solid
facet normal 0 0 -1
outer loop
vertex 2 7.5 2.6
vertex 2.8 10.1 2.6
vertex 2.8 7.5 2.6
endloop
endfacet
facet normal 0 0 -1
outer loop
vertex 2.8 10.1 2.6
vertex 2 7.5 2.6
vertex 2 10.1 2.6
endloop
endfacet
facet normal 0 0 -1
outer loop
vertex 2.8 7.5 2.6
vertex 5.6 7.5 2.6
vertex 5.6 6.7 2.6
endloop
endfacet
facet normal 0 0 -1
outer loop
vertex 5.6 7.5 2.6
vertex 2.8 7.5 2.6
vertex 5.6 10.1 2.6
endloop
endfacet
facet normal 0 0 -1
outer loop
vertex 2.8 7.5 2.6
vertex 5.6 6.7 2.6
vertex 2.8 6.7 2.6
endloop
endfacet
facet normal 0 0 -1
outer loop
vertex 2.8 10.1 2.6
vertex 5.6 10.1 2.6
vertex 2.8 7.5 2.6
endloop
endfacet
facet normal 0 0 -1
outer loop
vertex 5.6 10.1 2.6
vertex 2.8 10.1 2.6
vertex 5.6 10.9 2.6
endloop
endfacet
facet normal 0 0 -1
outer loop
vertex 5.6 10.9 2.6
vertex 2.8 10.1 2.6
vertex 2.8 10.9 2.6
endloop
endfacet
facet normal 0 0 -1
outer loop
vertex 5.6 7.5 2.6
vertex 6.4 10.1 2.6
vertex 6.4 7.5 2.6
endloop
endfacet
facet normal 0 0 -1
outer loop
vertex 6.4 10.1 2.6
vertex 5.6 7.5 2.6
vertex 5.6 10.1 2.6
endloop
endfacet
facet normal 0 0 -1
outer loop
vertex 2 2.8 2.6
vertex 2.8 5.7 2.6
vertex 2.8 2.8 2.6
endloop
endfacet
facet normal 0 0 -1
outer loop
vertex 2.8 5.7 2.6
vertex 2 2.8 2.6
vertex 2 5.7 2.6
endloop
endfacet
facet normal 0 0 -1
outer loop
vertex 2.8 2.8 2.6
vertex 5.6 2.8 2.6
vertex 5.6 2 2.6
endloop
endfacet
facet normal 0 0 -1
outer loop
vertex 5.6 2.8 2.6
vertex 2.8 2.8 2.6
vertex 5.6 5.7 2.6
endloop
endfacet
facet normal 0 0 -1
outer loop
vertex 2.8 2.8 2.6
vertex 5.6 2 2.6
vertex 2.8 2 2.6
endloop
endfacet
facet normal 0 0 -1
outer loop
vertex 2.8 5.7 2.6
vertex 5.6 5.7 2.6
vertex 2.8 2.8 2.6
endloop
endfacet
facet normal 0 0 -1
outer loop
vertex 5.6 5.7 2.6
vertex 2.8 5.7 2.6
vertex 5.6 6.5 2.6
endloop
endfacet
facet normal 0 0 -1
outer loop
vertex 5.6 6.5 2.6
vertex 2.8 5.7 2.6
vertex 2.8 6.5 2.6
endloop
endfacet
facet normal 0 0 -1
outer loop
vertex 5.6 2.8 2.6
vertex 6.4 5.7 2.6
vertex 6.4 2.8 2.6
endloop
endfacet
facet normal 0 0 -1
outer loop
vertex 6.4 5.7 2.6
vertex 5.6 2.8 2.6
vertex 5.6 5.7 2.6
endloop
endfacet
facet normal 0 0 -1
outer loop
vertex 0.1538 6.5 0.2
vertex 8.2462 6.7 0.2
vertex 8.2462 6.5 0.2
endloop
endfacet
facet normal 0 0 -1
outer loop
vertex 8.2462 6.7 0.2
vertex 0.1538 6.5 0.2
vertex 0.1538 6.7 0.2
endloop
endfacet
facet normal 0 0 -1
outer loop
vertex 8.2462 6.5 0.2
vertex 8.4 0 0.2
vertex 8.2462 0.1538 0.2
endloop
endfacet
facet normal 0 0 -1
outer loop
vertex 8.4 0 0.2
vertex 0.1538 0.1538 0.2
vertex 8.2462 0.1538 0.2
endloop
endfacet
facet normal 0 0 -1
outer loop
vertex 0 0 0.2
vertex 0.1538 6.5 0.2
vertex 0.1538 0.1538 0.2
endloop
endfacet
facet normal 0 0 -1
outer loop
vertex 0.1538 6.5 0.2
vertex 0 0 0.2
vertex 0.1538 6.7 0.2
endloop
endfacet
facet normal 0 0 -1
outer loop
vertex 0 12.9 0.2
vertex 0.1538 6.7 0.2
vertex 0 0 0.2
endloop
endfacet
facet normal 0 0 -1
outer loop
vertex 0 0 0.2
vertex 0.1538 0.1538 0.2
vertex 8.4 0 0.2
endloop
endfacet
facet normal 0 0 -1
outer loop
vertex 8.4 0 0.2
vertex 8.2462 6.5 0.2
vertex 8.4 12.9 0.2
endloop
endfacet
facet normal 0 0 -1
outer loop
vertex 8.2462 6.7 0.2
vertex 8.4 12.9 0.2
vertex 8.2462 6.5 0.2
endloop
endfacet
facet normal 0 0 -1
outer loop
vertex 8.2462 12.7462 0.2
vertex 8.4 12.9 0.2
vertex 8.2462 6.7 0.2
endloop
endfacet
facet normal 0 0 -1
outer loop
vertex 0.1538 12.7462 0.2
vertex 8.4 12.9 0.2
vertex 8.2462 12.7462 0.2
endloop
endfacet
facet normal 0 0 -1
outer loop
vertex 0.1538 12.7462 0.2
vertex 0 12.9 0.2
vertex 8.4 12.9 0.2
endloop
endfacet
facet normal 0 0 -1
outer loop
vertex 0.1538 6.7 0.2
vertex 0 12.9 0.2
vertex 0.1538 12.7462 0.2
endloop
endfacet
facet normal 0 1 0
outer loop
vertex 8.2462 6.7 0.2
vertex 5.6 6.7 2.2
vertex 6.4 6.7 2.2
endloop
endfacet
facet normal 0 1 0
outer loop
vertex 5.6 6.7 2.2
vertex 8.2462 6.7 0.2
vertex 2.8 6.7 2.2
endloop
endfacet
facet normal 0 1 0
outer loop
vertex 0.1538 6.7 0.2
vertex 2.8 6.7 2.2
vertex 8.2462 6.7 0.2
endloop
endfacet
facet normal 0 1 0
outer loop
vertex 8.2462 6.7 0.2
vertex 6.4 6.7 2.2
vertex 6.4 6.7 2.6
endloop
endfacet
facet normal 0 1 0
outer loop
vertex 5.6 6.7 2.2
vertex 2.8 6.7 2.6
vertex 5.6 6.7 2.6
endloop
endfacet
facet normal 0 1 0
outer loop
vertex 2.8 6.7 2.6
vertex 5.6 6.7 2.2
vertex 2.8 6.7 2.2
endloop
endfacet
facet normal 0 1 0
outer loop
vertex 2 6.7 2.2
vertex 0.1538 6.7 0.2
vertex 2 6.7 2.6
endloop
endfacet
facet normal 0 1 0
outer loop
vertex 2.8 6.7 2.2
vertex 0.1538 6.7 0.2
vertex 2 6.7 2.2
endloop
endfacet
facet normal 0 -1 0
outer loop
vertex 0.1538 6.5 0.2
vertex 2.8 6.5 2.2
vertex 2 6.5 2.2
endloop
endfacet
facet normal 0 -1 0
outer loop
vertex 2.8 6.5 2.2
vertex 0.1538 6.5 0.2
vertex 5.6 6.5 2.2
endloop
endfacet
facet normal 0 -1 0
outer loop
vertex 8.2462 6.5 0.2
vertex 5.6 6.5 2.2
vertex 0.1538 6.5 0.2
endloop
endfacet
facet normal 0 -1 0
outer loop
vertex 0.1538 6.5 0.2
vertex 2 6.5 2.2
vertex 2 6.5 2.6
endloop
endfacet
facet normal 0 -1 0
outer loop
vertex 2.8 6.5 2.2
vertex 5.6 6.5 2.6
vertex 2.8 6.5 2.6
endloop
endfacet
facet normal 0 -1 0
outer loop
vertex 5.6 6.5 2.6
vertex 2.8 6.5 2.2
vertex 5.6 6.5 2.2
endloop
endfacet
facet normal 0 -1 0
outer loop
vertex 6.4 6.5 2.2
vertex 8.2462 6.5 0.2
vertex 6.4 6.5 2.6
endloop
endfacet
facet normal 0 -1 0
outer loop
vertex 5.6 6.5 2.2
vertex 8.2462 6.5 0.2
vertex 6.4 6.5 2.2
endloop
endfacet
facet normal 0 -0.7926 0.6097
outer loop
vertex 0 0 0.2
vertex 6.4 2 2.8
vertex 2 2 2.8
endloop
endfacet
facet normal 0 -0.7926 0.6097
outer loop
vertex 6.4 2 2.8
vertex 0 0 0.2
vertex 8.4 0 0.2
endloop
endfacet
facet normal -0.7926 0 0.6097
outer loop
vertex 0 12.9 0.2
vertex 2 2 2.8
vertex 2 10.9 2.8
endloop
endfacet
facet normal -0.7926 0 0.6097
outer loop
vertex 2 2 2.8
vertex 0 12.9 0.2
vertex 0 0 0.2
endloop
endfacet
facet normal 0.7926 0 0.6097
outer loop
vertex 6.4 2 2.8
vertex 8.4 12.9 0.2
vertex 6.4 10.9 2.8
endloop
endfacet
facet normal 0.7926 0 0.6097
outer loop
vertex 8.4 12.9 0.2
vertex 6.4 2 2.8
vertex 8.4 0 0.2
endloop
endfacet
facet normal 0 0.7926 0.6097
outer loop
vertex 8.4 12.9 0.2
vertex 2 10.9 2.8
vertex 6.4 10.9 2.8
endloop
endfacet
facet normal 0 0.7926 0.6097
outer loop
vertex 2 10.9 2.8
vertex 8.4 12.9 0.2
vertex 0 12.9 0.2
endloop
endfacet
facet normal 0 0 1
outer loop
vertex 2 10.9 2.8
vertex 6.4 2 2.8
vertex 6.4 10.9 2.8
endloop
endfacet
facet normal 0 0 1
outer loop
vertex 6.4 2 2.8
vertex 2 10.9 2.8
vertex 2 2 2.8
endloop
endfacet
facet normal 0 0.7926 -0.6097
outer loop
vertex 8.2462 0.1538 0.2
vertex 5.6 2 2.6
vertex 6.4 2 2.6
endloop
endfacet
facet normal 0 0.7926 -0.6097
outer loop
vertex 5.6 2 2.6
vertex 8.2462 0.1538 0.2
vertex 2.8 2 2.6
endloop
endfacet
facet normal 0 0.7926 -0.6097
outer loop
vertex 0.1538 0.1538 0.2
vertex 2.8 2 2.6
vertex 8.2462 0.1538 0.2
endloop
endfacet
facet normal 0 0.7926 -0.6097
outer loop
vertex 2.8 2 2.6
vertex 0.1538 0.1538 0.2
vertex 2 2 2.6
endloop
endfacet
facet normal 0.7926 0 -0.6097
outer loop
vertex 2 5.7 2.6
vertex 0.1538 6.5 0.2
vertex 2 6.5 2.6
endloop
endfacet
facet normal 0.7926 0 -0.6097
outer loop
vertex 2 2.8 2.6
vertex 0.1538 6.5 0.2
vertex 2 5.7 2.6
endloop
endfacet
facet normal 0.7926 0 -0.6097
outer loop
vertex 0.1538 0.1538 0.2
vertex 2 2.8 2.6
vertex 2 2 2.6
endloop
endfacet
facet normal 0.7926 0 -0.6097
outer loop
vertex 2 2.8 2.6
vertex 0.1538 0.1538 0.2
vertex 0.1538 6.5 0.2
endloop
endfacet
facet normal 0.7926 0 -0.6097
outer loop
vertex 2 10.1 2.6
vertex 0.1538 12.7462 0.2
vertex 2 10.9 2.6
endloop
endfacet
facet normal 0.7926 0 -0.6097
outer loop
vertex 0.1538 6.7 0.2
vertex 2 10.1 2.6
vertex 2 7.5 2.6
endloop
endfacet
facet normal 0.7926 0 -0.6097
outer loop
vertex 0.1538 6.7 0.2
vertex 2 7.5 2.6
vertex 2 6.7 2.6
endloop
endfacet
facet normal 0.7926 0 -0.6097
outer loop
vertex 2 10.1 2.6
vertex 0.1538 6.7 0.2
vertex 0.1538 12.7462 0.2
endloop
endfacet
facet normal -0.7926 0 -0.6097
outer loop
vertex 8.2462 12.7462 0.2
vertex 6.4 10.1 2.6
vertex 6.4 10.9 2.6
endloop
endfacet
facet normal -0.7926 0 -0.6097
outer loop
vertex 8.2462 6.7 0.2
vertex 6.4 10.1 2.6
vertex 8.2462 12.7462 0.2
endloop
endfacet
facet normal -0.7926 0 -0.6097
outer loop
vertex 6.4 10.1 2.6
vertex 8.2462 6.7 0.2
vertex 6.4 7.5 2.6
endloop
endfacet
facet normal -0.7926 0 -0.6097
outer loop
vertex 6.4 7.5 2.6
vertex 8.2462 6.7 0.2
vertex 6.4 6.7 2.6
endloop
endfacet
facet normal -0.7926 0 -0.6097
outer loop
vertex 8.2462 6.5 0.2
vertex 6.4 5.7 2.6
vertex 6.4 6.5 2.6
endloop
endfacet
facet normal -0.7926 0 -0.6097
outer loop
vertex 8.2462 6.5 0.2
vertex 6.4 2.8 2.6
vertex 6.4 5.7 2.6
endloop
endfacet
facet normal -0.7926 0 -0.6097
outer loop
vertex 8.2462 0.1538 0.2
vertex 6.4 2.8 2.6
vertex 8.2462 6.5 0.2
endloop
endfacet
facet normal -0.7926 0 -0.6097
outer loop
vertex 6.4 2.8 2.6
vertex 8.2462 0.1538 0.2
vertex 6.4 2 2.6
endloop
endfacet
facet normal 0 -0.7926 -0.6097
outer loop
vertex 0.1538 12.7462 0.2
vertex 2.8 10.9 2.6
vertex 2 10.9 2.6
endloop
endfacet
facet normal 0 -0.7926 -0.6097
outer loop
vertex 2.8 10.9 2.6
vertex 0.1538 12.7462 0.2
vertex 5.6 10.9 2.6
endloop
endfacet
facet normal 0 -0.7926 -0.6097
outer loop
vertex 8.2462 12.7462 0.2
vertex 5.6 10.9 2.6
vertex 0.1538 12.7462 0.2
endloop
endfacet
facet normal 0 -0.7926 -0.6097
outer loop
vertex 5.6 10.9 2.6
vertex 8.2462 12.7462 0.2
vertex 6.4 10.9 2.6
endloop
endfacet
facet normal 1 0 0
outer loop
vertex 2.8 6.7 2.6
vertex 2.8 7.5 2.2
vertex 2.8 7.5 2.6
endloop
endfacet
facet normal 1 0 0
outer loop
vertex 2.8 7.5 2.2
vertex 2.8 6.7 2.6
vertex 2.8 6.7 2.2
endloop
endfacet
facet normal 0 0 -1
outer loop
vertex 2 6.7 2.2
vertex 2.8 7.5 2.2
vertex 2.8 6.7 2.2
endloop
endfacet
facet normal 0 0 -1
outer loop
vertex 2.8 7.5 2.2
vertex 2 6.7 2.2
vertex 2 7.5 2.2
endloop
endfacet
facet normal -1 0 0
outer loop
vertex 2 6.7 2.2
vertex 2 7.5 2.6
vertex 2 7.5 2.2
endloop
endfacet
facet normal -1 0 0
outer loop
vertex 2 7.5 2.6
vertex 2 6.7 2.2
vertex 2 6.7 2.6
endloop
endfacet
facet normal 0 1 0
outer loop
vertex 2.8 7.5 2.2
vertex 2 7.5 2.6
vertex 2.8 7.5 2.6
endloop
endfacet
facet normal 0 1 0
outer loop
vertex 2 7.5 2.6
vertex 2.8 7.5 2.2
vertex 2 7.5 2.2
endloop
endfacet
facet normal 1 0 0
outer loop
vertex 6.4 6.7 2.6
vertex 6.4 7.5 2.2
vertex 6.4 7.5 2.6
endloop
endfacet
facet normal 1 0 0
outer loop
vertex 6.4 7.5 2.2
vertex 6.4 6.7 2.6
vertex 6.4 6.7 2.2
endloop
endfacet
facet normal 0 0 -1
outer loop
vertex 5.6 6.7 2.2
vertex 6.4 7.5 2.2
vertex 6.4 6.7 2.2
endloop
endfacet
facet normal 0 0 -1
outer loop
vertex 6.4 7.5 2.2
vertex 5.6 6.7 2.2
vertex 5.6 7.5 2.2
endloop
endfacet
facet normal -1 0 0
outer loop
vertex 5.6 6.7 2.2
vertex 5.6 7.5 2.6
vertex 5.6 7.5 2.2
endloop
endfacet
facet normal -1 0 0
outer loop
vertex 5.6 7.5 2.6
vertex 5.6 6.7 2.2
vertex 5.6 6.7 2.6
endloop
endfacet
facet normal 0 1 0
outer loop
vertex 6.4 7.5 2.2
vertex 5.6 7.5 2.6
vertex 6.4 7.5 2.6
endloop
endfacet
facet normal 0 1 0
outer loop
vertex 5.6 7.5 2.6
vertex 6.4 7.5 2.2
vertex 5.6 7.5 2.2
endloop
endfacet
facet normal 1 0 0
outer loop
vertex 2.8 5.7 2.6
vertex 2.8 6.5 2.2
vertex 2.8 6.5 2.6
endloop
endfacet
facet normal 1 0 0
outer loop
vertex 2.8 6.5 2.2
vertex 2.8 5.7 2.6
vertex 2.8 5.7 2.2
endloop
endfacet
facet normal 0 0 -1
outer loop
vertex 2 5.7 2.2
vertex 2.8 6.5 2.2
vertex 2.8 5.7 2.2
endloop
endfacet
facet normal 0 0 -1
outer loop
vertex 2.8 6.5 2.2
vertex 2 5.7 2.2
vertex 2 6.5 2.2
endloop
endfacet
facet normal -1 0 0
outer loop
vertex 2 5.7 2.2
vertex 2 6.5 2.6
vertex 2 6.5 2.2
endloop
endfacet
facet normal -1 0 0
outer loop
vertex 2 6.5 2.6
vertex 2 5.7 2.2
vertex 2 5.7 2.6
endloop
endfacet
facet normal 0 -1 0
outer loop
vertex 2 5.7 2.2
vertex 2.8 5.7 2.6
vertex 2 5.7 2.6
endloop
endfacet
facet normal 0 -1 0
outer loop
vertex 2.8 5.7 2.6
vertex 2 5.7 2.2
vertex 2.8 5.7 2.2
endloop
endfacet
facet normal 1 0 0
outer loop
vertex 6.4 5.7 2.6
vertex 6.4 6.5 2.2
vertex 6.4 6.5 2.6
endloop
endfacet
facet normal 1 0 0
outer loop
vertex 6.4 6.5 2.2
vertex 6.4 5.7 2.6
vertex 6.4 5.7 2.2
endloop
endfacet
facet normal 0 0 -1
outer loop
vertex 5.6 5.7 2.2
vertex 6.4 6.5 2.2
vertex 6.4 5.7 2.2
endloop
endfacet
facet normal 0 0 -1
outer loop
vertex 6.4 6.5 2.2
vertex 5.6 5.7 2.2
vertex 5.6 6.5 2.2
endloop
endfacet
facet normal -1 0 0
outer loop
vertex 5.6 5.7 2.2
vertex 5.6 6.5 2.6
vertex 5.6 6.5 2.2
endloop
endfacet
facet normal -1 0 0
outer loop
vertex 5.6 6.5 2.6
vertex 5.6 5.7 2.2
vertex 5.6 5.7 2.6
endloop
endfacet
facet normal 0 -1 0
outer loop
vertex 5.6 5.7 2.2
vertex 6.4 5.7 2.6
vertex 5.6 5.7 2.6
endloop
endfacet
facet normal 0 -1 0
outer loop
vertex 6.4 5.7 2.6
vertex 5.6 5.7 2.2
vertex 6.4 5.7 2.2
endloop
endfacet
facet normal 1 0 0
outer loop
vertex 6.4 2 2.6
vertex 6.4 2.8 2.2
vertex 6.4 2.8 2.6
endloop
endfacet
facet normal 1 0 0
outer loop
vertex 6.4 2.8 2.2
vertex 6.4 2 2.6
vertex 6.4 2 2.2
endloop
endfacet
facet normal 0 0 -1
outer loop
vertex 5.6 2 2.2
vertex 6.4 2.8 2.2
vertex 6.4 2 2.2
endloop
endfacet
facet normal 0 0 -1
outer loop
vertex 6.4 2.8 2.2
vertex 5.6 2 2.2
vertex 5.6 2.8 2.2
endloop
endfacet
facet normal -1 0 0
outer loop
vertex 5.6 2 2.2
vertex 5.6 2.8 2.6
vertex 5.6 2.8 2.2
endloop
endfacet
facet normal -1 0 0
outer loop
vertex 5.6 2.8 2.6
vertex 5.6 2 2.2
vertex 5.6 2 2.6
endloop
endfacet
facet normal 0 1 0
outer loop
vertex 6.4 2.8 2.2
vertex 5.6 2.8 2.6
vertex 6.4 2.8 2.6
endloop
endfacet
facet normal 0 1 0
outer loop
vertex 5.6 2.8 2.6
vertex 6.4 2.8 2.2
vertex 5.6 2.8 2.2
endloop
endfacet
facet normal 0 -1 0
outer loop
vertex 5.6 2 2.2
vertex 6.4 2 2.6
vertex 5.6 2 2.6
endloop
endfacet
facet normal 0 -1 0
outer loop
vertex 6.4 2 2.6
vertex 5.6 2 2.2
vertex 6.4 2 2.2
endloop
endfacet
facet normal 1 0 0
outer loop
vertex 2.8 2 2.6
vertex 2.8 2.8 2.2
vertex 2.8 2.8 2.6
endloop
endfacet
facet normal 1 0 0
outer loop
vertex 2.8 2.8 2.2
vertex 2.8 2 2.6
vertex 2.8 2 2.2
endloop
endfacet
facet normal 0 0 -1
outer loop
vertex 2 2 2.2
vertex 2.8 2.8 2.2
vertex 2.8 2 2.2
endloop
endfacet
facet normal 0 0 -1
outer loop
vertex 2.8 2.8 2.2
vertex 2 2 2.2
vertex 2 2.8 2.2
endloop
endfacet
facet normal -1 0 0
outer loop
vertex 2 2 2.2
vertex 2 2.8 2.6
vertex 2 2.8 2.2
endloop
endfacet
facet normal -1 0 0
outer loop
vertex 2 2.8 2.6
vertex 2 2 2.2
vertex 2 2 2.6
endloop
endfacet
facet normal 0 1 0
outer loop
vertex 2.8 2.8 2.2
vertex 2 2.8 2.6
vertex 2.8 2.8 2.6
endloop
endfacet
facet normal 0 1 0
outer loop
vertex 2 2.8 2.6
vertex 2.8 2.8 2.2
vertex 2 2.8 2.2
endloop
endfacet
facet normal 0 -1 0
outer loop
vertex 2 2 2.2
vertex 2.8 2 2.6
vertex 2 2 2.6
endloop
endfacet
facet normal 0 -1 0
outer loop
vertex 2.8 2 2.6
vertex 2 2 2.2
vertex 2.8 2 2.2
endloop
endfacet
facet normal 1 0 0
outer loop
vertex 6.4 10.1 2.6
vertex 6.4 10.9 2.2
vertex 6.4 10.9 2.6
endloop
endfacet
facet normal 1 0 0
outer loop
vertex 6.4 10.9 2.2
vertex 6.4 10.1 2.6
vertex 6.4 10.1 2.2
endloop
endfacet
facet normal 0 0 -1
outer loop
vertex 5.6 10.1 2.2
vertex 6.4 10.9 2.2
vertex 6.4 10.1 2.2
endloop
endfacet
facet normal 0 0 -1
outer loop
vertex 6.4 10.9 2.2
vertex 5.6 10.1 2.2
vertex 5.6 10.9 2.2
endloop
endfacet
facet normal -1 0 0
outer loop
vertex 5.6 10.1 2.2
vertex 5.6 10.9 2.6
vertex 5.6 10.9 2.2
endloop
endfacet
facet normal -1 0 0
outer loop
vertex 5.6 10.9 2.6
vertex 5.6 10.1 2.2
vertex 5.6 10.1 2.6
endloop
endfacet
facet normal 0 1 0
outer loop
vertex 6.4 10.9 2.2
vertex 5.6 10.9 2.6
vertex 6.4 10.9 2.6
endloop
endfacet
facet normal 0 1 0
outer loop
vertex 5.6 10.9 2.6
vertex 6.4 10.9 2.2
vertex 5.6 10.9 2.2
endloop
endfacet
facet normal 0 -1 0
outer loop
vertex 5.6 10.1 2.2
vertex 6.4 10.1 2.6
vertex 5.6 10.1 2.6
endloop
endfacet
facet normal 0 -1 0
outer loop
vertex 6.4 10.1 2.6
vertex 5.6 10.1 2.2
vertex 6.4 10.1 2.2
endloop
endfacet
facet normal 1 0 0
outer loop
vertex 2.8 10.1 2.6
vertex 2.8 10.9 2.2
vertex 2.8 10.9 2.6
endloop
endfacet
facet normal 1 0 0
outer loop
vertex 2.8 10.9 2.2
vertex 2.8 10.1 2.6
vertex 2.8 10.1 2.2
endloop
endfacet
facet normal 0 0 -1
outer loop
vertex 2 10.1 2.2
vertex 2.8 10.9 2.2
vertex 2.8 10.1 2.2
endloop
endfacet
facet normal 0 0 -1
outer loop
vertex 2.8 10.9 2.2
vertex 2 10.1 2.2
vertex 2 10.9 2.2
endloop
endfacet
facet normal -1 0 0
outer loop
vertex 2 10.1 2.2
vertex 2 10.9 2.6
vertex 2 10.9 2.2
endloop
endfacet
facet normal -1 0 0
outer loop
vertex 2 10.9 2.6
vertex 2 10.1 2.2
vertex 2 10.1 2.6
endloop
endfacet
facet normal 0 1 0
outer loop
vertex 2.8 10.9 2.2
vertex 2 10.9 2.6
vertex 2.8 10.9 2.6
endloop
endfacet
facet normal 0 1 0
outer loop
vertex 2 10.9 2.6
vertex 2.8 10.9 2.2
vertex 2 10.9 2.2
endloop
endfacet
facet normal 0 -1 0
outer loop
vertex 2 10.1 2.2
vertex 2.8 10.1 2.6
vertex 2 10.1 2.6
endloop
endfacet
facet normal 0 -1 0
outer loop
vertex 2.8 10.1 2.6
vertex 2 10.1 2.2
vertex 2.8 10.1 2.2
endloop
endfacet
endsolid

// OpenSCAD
// file: ../modules/objects/tapered_cuboid.scad
// Creates a tapered cuboid

module tapered_cuboid(width, length, height, taper) {
	ho = taper;
	hwidth = width - taper;
	hlength = length - taper;
	polyhedron( points=[
		[ 0,  0, 0],
		[ho, ho, height],
		[hwidth, ho, height],
		[ width,  0, 0],
		[ 0,  length, 0],
		[ho, hlength, height],
		[hwidth, hlength, height],
		[ width,  length, 0] 
	], faces = [
		//side face
		[0, 1, 2],
		[2, 3, 0],
		//side face
		[3, 2, 6],
		[6, 7, 3],
		//side face
		[7, 6, 5],
		[5, 4, 7],
		//side face
		[4, 5, 1],
		[1, 0, 4],
		//top face
		[1, 5, 2],
		[2, 5, 6],
		//bottom face
		[4, 0, 3],
		[7, 4, 3],
	] );
}
// file: ../modules/objects/right_angled_triangle.scad
// Creates a right angled triangle

module right_angled_triangle(width, length, height) {
    linear_extrude(height)
    polygon(points=[[0, 0], [width, 0], [0, length]]);
}
// file: ../modules/objects/perforated_plate.scad
// Creates a square plate with holes in it

module perforated_plate(size, hole_diameter, distance_to_border, hole_count = [2,2] ) {

	if (hole_count.x == 0 || hole_count.y == 0) {

		cube( size );

	} else {

		difference() {

			cube( size );

			randabstand   = distance_to_border + hole_diameter/2;
			x_lochdistanz = hole_count.x > 1 ? (size.x - 2*randabstand) / (hole_count.x - 1) : 0;
			y_lochdistanz = hole_count.y > 1 ? (size.y - 2*randabstand) / (hole_count.y - 1) : 0;
			x_werte       = hole_count.x > 1 ? 
							[randabstand : x_lochdistanz : size.x - randabstand + 0.1] :
							[size.x / 2];
			y_werte       = hole_count.y > 1 ?
			                [randabstand : y_lochdistanz : size.y - randabstand + 0.1] :
			                [size.y / 2];

			// Bohrlöcher
			for (x = x_werte, y = y_werte)
		    translate( [x, y, -1] )
		    cylinder( d = hole_diameter, h = size.z + 2);

		}

	}
}
// main file
include <../modules/objects/perforated_plate.scad>
include <../modules/objects/right_angled_triangle.scad>
include <../modules/objects/tapered_cuboid.scad>

$fn=360;

// Spacers
translate([2,6.7,2.2]) {
    cube([.8,.8,.4]);
}

translate([5.6,6.7,2.2]) {
    cube([.8,.8,.4]);
}

translate([2.0,5.7,2.2]) {
    cube([.8,.8,.4]);
}

translate([5.6,5.7,2.2]) {
    cube([.8,.8,.4]);
}

translate([5.6,2,2.2]) {
    cube([.8,.8,.4]);
}

translate([2.0,2,2.2]) {
    cube([.8,.8,.4]);
}

translate([5.6,10.1,2.2]) {
    cube([.8,.8,.4]);
}

translate([2.0,10.1,2.2]) {
    cube([.8,.8,.4]);
}


// Middle wall
difference() {
    translate([0,6.5,.2]) {
        cube([8.4,.2,2.4]);
    }

    translate([-0.2,6.4,2.7]) {
        rotate([-90,0,0]) {
            right_angled_triangle(2.2,2.8,.4);
        }
    }

    translate([8.6,6.4,2.7]) {
        rotate([-90,0,00]) {
            right_angled_triangle(-2.2,2.8,.4);
        }
    }
}

// Hull
difference() {
    translate([0,0,.2]) {
        tapered_cuboid(8.4, 12.9, 2.6, 2);
    }

    tapered_cuboid(8.4, 12.9, 2.6, 2);
}


// Drip tray
/*
translate([2.15,1.95,2]) {
    perforated_plate([4.5,4.5,.2], .5, .5,[3,3]);
}
*/
